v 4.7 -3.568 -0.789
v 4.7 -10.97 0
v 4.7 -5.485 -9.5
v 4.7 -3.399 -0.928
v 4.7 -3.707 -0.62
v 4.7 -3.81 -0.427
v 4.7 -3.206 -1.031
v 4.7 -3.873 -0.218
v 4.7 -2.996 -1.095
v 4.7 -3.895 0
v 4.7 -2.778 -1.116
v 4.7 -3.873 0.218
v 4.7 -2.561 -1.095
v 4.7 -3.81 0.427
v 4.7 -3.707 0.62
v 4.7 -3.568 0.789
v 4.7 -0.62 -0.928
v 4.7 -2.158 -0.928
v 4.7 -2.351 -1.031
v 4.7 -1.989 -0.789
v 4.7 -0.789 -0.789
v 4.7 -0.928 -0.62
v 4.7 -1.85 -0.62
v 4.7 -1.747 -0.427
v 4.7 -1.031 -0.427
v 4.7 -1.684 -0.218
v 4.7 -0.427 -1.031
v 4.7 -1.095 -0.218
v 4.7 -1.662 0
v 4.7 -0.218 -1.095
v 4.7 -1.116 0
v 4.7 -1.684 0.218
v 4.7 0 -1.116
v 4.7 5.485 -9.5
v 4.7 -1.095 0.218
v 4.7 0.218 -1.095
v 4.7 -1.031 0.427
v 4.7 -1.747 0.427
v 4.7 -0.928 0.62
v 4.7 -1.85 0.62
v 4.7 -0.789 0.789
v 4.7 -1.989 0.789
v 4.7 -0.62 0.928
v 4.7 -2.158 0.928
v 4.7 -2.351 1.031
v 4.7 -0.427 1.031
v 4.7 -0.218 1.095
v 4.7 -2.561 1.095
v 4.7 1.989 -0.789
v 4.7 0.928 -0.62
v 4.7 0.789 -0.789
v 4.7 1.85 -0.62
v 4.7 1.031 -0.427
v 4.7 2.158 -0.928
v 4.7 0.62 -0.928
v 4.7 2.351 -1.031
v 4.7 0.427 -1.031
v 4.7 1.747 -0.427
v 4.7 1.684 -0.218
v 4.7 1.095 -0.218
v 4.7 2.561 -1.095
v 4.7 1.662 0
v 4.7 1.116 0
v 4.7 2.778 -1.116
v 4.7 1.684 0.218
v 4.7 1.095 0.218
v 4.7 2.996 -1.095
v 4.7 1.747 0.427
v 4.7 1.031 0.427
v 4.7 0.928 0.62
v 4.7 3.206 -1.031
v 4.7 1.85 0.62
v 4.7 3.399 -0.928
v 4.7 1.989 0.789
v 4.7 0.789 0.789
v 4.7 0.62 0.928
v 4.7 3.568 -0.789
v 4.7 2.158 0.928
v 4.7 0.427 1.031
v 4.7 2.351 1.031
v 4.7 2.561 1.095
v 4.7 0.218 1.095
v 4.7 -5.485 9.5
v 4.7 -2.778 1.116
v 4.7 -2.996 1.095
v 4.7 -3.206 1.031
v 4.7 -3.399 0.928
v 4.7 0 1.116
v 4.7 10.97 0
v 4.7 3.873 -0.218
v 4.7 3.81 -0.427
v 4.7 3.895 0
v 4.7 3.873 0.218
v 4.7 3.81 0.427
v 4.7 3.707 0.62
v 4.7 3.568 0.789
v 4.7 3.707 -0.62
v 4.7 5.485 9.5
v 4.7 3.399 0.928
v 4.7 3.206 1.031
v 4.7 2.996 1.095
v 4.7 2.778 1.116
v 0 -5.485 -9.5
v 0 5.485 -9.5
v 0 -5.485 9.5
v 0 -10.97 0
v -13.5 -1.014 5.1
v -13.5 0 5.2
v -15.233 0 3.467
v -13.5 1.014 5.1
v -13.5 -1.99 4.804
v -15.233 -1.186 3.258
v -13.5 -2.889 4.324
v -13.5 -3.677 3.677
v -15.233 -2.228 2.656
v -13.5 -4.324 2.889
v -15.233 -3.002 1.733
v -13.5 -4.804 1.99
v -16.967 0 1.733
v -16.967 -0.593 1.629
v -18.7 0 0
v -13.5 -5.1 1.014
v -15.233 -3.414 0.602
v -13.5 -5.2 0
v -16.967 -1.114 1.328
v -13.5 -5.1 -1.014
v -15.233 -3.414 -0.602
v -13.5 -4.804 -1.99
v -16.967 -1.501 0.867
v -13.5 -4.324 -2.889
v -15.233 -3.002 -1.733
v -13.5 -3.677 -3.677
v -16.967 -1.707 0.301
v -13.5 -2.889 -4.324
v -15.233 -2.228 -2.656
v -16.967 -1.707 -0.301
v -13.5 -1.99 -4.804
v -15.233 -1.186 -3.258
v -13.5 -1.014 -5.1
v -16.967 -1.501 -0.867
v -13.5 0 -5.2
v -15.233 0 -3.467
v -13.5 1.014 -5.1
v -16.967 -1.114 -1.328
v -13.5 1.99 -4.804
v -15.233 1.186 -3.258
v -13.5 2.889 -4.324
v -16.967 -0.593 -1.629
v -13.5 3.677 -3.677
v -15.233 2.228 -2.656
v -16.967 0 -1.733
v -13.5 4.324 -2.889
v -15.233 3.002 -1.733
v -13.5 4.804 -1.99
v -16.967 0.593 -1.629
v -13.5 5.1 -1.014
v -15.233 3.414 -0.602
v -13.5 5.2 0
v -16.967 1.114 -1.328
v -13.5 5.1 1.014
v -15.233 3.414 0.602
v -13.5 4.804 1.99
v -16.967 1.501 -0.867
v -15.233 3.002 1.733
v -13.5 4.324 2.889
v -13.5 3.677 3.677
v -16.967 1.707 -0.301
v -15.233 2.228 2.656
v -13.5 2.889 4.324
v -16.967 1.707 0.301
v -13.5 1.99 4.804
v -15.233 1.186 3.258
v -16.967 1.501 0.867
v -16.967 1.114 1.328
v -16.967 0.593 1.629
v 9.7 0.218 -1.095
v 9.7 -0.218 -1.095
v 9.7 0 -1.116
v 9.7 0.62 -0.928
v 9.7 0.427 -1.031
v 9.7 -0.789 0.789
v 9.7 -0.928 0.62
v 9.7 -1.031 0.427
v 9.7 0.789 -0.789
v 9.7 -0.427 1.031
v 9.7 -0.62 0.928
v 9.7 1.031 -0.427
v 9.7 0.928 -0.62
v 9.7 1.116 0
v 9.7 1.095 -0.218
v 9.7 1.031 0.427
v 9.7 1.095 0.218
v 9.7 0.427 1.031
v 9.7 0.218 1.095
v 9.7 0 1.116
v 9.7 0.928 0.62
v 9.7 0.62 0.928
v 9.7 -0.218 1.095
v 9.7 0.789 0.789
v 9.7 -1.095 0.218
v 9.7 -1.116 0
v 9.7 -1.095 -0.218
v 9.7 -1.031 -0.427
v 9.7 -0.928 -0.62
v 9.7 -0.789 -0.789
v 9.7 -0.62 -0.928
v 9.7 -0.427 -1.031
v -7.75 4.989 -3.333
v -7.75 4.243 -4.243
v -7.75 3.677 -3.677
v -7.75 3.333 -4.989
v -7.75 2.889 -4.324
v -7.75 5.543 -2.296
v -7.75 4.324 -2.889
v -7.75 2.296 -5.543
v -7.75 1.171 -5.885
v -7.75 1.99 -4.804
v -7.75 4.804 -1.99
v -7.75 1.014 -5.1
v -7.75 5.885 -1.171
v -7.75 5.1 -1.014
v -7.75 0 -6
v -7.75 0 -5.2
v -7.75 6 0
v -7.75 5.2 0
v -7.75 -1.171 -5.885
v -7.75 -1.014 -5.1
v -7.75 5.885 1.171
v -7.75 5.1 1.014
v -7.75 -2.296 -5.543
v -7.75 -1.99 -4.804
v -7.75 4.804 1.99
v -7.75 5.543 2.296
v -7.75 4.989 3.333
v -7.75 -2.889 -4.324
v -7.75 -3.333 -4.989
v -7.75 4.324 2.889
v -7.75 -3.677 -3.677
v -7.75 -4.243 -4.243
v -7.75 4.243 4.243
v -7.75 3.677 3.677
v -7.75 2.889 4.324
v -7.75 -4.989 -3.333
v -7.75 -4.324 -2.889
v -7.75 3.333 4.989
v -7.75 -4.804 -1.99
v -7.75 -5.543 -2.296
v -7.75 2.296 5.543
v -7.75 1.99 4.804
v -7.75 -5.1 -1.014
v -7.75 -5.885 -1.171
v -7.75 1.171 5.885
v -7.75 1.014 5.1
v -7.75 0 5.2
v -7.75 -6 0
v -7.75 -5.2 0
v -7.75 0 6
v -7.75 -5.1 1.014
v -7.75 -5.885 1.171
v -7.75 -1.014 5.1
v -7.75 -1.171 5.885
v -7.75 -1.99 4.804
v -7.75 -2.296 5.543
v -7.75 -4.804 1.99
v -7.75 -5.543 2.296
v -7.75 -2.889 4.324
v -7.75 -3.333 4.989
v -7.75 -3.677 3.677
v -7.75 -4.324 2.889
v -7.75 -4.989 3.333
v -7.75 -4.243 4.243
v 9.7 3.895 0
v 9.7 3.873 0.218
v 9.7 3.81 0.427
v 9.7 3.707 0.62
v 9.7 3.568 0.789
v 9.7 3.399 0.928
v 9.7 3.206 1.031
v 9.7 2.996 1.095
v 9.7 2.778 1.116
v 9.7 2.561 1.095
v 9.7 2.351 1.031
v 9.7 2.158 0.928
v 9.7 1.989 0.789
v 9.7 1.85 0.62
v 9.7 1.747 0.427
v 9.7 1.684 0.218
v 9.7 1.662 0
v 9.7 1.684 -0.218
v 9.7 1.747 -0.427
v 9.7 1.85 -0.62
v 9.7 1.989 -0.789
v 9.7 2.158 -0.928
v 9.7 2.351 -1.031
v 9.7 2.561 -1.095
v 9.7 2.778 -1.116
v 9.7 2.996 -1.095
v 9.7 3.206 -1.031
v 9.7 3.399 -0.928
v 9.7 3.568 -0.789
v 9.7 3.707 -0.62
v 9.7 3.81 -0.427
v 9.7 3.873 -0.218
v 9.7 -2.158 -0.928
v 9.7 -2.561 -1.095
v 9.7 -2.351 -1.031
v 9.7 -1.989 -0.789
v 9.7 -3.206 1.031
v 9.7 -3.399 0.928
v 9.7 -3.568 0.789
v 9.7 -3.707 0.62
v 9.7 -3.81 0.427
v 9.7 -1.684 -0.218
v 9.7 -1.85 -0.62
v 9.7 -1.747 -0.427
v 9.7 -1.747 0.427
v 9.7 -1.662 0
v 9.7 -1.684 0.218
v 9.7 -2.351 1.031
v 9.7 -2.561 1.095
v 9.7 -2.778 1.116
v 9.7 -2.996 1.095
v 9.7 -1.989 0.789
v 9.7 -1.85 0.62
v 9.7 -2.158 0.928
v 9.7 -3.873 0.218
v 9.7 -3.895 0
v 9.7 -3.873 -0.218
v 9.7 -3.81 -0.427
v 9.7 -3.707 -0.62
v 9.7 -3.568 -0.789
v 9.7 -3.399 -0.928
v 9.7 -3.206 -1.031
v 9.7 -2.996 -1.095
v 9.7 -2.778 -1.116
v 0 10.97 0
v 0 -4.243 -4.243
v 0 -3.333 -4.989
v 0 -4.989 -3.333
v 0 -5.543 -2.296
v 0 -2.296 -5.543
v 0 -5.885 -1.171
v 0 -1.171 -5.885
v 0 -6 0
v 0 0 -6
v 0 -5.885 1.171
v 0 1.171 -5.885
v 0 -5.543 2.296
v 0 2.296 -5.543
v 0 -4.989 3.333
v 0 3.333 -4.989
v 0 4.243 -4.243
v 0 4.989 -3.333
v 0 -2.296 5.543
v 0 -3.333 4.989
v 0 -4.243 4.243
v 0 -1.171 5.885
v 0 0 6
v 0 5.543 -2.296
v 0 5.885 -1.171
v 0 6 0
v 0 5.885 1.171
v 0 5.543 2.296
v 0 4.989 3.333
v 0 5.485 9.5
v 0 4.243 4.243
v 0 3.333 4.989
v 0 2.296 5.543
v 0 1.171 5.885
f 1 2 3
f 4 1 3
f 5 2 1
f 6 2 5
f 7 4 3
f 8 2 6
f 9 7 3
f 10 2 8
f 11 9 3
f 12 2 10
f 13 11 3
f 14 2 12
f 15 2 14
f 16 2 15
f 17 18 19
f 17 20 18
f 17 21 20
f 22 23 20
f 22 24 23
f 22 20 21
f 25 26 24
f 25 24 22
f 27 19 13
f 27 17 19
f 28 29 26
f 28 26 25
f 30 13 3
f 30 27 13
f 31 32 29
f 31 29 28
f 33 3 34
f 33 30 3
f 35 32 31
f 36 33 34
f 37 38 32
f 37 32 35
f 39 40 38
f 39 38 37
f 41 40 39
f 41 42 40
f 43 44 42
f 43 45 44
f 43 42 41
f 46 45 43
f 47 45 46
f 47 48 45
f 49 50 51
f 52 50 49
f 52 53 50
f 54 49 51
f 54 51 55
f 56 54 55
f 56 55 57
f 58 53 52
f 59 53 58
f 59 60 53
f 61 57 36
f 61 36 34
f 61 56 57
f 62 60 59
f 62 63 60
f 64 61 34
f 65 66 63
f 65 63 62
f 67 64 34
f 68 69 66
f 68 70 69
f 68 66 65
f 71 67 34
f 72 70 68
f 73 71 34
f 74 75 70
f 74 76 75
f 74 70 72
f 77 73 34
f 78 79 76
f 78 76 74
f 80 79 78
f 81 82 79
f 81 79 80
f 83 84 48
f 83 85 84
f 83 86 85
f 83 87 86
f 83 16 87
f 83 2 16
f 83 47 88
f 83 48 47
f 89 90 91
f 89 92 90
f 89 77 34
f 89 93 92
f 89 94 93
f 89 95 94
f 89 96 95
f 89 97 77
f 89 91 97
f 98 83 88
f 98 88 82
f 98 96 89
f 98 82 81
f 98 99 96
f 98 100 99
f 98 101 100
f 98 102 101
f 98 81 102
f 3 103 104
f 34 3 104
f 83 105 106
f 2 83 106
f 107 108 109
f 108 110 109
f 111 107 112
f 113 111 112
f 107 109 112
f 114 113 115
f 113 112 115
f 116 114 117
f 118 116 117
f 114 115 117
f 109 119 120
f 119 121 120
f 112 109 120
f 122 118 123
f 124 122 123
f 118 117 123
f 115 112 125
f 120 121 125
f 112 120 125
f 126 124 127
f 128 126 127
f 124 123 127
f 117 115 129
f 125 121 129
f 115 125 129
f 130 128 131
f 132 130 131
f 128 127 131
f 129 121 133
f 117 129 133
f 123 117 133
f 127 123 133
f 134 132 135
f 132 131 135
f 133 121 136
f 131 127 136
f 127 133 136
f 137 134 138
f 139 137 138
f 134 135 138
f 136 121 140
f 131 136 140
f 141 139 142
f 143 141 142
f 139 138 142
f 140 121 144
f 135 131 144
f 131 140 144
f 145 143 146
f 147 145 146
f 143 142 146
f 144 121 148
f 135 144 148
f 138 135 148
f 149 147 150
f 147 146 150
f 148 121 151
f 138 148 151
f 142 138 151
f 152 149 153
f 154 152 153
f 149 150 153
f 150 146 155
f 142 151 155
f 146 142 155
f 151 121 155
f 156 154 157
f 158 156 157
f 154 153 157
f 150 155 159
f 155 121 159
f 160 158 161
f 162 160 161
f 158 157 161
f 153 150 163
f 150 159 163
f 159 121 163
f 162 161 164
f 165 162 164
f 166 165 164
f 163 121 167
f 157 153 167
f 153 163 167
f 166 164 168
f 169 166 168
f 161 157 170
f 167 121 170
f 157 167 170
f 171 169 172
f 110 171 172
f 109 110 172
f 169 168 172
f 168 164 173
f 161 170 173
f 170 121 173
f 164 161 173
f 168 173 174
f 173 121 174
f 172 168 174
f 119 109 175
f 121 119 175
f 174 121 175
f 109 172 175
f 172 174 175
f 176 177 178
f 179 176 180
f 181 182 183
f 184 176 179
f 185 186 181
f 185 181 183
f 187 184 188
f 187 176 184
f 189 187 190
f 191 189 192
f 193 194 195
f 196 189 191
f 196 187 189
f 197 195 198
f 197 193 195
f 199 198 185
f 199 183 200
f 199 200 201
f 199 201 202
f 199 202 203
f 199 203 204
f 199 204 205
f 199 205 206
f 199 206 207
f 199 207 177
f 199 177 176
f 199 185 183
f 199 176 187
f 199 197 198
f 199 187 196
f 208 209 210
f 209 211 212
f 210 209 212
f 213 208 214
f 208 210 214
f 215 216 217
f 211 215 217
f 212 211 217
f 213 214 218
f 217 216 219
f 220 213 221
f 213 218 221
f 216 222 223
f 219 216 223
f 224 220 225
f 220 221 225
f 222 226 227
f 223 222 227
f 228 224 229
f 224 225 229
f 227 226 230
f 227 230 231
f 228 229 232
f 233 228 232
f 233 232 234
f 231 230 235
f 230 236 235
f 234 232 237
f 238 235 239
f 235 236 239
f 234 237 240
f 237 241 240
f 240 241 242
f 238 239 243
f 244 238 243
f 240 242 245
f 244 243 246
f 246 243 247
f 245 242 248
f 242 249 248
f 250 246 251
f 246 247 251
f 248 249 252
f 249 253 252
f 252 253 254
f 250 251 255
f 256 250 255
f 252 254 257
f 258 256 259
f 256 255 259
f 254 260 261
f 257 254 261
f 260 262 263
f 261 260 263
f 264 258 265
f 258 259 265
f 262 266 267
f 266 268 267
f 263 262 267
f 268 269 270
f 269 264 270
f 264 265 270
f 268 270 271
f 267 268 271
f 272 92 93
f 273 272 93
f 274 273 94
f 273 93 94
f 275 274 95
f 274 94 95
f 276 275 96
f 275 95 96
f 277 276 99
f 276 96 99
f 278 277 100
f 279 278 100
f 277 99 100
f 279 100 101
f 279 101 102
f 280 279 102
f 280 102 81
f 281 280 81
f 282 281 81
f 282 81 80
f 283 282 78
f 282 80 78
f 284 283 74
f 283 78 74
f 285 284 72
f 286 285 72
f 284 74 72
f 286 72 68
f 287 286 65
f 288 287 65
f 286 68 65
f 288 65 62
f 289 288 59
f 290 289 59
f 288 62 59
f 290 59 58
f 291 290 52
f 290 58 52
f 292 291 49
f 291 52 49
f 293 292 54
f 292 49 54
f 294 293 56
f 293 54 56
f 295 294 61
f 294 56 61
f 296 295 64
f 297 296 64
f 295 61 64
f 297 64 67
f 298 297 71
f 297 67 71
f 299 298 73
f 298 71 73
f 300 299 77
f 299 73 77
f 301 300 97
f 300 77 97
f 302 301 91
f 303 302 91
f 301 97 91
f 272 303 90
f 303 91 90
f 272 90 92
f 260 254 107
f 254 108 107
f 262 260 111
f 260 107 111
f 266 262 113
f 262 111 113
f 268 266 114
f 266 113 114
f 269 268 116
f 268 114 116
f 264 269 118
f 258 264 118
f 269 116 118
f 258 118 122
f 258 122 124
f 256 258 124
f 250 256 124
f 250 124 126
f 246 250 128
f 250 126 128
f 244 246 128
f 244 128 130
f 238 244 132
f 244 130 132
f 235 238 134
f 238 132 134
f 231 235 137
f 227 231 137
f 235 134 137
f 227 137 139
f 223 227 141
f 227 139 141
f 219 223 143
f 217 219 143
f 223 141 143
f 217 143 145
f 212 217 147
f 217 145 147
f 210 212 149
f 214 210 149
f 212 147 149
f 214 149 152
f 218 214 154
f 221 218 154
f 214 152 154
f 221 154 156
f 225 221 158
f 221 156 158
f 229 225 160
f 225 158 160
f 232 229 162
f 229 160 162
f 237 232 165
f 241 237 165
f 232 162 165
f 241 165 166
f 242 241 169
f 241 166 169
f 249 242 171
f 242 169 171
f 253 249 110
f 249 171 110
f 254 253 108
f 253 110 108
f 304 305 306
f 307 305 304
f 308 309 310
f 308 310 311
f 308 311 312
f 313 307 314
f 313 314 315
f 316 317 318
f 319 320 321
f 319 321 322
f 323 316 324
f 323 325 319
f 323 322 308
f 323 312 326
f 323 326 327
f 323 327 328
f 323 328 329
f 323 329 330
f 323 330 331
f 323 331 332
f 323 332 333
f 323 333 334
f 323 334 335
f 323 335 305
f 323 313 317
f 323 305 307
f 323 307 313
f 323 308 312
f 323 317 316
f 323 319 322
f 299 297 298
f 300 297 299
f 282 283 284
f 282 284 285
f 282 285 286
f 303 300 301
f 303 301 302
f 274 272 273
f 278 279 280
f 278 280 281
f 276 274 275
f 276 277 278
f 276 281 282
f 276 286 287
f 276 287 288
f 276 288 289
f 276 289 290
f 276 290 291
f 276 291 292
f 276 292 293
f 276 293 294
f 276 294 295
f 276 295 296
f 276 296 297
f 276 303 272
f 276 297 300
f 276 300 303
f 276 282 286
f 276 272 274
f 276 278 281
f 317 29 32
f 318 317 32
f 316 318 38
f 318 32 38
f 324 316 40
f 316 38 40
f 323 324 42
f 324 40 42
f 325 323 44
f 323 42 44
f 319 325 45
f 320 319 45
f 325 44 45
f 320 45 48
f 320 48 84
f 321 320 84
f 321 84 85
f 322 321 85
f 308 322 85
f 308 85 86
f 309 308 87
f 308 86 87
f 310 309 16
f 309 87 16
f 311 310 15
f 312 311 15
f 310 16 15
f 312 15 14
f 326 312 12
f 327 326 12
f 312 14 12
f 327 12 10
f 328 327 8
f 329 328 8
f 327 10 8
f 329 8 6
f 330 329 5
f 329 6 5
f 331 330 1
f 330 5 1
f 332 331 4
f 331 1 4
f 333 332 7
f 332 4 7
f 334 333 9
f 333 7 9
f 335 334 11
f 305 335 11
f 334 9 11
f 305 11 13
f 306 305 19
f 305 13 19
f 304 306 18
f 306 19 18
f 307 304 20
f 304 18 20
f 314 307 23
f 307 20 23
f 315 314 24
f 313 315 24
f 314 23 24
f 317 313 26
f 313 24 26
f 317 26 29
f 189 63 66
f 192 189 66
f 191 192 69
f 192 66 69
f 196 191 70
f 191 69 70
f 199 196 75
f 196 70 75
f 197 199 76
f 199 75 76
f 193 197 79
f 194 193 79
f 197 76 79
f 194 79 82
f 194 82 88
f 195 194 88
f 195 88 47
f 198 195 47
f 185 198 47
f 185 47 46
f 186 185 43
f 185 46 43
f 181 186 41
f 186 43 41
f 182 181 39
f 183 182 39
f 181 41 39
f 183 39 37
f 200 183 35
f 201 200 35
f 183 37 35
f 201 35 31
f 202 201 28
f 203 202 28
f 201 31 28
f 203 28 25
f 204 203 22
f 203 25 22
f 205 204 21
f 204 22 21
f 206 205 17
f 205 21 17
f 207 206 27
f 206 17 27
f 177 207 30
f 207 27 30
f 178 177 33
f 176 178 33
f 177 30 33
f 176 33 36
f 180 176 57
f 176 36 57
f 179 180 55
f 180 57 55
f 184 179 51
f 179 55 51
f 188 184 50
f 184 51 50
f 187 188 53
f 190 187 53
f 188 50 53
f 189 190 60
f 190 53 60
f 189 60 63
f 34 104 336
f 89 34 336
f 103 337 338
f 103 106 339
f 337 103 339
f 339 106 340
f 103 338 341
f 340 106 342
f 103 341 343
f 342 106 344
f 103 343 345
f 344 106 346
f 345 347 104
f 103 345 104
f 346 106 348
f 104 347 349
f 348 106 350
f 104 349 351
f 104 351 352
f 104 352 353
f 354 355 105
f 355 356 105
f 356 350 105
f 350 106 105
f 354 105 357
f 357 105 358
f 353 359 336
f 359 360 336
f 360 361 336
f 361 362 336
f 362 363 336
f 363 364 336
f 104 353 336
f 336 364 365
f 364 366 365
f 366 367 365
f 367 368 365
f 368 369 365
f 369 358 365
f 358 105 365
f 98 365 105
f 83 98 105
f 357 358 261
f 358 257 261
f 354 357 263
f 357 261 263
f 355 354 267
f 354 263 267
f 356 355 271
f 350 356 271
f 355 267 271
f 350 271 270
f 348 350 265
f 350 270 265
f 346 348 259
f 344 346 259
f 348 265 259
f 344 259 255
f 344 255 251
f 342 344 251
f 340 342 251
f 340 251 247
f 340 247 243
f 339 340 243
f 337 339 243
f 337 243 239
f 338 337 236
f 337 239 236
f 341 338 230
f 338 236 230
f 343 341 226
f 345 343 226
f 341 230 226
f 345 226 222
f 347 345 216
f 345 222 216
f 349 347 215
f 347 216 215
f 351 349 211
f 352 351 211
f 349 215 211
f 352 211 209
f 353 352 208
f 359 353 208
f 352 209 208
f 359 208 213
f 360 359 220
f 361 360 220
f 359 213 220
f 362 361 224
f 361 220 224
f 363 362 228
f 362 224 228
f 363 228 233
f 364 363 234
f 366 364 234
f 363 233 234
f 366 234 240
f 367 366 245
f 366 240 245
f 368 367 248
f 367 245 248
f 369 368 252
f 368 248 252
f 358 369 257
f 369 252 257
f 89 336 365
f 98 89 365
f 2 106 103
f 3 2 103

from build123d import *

# Parameters (mm, degrees)
F3_DEPTH = 4.7
F4_R     = 1.116349
F5_DEPTH = 5


with BuildPart() as f1:
    # F0 (on Front) → F1 (revolve)
    with BuildSketch(Plane.XZ):
        Polygon((0, 0), (0, 6), (-7.75, 6), (-7.75, 5.2), (-13.5, 5.2), (-18.7, 0), align=None)
    revolve(axis=Axis((-9.35, 0, 0), (1, 0, 0)))

    # F2 (on face) → F3 (join)
    with BuildSketch(Plane.YZ):
        Polygon((-5.484828, -9.5), (5.484828, -9.5), (10.969655, 0), (5.484828, 9.5), (-5.484828, 9.5), (-10.969655, 0), align=None)
    extrude(amount=F3_DEPTH)

    # F4 (on face) → F5 (join)
    with BuildSketch(Plane.YZ.offset(4.7)):
        with Locations((-2.778471, 0)):
            Circle(F4_R)
        with Locations((2.778471, 0)):
            Circle(F4_R)
        Circle(F4_R)
    extrude(amount=F5_DEPTH)


solid = f1.part
